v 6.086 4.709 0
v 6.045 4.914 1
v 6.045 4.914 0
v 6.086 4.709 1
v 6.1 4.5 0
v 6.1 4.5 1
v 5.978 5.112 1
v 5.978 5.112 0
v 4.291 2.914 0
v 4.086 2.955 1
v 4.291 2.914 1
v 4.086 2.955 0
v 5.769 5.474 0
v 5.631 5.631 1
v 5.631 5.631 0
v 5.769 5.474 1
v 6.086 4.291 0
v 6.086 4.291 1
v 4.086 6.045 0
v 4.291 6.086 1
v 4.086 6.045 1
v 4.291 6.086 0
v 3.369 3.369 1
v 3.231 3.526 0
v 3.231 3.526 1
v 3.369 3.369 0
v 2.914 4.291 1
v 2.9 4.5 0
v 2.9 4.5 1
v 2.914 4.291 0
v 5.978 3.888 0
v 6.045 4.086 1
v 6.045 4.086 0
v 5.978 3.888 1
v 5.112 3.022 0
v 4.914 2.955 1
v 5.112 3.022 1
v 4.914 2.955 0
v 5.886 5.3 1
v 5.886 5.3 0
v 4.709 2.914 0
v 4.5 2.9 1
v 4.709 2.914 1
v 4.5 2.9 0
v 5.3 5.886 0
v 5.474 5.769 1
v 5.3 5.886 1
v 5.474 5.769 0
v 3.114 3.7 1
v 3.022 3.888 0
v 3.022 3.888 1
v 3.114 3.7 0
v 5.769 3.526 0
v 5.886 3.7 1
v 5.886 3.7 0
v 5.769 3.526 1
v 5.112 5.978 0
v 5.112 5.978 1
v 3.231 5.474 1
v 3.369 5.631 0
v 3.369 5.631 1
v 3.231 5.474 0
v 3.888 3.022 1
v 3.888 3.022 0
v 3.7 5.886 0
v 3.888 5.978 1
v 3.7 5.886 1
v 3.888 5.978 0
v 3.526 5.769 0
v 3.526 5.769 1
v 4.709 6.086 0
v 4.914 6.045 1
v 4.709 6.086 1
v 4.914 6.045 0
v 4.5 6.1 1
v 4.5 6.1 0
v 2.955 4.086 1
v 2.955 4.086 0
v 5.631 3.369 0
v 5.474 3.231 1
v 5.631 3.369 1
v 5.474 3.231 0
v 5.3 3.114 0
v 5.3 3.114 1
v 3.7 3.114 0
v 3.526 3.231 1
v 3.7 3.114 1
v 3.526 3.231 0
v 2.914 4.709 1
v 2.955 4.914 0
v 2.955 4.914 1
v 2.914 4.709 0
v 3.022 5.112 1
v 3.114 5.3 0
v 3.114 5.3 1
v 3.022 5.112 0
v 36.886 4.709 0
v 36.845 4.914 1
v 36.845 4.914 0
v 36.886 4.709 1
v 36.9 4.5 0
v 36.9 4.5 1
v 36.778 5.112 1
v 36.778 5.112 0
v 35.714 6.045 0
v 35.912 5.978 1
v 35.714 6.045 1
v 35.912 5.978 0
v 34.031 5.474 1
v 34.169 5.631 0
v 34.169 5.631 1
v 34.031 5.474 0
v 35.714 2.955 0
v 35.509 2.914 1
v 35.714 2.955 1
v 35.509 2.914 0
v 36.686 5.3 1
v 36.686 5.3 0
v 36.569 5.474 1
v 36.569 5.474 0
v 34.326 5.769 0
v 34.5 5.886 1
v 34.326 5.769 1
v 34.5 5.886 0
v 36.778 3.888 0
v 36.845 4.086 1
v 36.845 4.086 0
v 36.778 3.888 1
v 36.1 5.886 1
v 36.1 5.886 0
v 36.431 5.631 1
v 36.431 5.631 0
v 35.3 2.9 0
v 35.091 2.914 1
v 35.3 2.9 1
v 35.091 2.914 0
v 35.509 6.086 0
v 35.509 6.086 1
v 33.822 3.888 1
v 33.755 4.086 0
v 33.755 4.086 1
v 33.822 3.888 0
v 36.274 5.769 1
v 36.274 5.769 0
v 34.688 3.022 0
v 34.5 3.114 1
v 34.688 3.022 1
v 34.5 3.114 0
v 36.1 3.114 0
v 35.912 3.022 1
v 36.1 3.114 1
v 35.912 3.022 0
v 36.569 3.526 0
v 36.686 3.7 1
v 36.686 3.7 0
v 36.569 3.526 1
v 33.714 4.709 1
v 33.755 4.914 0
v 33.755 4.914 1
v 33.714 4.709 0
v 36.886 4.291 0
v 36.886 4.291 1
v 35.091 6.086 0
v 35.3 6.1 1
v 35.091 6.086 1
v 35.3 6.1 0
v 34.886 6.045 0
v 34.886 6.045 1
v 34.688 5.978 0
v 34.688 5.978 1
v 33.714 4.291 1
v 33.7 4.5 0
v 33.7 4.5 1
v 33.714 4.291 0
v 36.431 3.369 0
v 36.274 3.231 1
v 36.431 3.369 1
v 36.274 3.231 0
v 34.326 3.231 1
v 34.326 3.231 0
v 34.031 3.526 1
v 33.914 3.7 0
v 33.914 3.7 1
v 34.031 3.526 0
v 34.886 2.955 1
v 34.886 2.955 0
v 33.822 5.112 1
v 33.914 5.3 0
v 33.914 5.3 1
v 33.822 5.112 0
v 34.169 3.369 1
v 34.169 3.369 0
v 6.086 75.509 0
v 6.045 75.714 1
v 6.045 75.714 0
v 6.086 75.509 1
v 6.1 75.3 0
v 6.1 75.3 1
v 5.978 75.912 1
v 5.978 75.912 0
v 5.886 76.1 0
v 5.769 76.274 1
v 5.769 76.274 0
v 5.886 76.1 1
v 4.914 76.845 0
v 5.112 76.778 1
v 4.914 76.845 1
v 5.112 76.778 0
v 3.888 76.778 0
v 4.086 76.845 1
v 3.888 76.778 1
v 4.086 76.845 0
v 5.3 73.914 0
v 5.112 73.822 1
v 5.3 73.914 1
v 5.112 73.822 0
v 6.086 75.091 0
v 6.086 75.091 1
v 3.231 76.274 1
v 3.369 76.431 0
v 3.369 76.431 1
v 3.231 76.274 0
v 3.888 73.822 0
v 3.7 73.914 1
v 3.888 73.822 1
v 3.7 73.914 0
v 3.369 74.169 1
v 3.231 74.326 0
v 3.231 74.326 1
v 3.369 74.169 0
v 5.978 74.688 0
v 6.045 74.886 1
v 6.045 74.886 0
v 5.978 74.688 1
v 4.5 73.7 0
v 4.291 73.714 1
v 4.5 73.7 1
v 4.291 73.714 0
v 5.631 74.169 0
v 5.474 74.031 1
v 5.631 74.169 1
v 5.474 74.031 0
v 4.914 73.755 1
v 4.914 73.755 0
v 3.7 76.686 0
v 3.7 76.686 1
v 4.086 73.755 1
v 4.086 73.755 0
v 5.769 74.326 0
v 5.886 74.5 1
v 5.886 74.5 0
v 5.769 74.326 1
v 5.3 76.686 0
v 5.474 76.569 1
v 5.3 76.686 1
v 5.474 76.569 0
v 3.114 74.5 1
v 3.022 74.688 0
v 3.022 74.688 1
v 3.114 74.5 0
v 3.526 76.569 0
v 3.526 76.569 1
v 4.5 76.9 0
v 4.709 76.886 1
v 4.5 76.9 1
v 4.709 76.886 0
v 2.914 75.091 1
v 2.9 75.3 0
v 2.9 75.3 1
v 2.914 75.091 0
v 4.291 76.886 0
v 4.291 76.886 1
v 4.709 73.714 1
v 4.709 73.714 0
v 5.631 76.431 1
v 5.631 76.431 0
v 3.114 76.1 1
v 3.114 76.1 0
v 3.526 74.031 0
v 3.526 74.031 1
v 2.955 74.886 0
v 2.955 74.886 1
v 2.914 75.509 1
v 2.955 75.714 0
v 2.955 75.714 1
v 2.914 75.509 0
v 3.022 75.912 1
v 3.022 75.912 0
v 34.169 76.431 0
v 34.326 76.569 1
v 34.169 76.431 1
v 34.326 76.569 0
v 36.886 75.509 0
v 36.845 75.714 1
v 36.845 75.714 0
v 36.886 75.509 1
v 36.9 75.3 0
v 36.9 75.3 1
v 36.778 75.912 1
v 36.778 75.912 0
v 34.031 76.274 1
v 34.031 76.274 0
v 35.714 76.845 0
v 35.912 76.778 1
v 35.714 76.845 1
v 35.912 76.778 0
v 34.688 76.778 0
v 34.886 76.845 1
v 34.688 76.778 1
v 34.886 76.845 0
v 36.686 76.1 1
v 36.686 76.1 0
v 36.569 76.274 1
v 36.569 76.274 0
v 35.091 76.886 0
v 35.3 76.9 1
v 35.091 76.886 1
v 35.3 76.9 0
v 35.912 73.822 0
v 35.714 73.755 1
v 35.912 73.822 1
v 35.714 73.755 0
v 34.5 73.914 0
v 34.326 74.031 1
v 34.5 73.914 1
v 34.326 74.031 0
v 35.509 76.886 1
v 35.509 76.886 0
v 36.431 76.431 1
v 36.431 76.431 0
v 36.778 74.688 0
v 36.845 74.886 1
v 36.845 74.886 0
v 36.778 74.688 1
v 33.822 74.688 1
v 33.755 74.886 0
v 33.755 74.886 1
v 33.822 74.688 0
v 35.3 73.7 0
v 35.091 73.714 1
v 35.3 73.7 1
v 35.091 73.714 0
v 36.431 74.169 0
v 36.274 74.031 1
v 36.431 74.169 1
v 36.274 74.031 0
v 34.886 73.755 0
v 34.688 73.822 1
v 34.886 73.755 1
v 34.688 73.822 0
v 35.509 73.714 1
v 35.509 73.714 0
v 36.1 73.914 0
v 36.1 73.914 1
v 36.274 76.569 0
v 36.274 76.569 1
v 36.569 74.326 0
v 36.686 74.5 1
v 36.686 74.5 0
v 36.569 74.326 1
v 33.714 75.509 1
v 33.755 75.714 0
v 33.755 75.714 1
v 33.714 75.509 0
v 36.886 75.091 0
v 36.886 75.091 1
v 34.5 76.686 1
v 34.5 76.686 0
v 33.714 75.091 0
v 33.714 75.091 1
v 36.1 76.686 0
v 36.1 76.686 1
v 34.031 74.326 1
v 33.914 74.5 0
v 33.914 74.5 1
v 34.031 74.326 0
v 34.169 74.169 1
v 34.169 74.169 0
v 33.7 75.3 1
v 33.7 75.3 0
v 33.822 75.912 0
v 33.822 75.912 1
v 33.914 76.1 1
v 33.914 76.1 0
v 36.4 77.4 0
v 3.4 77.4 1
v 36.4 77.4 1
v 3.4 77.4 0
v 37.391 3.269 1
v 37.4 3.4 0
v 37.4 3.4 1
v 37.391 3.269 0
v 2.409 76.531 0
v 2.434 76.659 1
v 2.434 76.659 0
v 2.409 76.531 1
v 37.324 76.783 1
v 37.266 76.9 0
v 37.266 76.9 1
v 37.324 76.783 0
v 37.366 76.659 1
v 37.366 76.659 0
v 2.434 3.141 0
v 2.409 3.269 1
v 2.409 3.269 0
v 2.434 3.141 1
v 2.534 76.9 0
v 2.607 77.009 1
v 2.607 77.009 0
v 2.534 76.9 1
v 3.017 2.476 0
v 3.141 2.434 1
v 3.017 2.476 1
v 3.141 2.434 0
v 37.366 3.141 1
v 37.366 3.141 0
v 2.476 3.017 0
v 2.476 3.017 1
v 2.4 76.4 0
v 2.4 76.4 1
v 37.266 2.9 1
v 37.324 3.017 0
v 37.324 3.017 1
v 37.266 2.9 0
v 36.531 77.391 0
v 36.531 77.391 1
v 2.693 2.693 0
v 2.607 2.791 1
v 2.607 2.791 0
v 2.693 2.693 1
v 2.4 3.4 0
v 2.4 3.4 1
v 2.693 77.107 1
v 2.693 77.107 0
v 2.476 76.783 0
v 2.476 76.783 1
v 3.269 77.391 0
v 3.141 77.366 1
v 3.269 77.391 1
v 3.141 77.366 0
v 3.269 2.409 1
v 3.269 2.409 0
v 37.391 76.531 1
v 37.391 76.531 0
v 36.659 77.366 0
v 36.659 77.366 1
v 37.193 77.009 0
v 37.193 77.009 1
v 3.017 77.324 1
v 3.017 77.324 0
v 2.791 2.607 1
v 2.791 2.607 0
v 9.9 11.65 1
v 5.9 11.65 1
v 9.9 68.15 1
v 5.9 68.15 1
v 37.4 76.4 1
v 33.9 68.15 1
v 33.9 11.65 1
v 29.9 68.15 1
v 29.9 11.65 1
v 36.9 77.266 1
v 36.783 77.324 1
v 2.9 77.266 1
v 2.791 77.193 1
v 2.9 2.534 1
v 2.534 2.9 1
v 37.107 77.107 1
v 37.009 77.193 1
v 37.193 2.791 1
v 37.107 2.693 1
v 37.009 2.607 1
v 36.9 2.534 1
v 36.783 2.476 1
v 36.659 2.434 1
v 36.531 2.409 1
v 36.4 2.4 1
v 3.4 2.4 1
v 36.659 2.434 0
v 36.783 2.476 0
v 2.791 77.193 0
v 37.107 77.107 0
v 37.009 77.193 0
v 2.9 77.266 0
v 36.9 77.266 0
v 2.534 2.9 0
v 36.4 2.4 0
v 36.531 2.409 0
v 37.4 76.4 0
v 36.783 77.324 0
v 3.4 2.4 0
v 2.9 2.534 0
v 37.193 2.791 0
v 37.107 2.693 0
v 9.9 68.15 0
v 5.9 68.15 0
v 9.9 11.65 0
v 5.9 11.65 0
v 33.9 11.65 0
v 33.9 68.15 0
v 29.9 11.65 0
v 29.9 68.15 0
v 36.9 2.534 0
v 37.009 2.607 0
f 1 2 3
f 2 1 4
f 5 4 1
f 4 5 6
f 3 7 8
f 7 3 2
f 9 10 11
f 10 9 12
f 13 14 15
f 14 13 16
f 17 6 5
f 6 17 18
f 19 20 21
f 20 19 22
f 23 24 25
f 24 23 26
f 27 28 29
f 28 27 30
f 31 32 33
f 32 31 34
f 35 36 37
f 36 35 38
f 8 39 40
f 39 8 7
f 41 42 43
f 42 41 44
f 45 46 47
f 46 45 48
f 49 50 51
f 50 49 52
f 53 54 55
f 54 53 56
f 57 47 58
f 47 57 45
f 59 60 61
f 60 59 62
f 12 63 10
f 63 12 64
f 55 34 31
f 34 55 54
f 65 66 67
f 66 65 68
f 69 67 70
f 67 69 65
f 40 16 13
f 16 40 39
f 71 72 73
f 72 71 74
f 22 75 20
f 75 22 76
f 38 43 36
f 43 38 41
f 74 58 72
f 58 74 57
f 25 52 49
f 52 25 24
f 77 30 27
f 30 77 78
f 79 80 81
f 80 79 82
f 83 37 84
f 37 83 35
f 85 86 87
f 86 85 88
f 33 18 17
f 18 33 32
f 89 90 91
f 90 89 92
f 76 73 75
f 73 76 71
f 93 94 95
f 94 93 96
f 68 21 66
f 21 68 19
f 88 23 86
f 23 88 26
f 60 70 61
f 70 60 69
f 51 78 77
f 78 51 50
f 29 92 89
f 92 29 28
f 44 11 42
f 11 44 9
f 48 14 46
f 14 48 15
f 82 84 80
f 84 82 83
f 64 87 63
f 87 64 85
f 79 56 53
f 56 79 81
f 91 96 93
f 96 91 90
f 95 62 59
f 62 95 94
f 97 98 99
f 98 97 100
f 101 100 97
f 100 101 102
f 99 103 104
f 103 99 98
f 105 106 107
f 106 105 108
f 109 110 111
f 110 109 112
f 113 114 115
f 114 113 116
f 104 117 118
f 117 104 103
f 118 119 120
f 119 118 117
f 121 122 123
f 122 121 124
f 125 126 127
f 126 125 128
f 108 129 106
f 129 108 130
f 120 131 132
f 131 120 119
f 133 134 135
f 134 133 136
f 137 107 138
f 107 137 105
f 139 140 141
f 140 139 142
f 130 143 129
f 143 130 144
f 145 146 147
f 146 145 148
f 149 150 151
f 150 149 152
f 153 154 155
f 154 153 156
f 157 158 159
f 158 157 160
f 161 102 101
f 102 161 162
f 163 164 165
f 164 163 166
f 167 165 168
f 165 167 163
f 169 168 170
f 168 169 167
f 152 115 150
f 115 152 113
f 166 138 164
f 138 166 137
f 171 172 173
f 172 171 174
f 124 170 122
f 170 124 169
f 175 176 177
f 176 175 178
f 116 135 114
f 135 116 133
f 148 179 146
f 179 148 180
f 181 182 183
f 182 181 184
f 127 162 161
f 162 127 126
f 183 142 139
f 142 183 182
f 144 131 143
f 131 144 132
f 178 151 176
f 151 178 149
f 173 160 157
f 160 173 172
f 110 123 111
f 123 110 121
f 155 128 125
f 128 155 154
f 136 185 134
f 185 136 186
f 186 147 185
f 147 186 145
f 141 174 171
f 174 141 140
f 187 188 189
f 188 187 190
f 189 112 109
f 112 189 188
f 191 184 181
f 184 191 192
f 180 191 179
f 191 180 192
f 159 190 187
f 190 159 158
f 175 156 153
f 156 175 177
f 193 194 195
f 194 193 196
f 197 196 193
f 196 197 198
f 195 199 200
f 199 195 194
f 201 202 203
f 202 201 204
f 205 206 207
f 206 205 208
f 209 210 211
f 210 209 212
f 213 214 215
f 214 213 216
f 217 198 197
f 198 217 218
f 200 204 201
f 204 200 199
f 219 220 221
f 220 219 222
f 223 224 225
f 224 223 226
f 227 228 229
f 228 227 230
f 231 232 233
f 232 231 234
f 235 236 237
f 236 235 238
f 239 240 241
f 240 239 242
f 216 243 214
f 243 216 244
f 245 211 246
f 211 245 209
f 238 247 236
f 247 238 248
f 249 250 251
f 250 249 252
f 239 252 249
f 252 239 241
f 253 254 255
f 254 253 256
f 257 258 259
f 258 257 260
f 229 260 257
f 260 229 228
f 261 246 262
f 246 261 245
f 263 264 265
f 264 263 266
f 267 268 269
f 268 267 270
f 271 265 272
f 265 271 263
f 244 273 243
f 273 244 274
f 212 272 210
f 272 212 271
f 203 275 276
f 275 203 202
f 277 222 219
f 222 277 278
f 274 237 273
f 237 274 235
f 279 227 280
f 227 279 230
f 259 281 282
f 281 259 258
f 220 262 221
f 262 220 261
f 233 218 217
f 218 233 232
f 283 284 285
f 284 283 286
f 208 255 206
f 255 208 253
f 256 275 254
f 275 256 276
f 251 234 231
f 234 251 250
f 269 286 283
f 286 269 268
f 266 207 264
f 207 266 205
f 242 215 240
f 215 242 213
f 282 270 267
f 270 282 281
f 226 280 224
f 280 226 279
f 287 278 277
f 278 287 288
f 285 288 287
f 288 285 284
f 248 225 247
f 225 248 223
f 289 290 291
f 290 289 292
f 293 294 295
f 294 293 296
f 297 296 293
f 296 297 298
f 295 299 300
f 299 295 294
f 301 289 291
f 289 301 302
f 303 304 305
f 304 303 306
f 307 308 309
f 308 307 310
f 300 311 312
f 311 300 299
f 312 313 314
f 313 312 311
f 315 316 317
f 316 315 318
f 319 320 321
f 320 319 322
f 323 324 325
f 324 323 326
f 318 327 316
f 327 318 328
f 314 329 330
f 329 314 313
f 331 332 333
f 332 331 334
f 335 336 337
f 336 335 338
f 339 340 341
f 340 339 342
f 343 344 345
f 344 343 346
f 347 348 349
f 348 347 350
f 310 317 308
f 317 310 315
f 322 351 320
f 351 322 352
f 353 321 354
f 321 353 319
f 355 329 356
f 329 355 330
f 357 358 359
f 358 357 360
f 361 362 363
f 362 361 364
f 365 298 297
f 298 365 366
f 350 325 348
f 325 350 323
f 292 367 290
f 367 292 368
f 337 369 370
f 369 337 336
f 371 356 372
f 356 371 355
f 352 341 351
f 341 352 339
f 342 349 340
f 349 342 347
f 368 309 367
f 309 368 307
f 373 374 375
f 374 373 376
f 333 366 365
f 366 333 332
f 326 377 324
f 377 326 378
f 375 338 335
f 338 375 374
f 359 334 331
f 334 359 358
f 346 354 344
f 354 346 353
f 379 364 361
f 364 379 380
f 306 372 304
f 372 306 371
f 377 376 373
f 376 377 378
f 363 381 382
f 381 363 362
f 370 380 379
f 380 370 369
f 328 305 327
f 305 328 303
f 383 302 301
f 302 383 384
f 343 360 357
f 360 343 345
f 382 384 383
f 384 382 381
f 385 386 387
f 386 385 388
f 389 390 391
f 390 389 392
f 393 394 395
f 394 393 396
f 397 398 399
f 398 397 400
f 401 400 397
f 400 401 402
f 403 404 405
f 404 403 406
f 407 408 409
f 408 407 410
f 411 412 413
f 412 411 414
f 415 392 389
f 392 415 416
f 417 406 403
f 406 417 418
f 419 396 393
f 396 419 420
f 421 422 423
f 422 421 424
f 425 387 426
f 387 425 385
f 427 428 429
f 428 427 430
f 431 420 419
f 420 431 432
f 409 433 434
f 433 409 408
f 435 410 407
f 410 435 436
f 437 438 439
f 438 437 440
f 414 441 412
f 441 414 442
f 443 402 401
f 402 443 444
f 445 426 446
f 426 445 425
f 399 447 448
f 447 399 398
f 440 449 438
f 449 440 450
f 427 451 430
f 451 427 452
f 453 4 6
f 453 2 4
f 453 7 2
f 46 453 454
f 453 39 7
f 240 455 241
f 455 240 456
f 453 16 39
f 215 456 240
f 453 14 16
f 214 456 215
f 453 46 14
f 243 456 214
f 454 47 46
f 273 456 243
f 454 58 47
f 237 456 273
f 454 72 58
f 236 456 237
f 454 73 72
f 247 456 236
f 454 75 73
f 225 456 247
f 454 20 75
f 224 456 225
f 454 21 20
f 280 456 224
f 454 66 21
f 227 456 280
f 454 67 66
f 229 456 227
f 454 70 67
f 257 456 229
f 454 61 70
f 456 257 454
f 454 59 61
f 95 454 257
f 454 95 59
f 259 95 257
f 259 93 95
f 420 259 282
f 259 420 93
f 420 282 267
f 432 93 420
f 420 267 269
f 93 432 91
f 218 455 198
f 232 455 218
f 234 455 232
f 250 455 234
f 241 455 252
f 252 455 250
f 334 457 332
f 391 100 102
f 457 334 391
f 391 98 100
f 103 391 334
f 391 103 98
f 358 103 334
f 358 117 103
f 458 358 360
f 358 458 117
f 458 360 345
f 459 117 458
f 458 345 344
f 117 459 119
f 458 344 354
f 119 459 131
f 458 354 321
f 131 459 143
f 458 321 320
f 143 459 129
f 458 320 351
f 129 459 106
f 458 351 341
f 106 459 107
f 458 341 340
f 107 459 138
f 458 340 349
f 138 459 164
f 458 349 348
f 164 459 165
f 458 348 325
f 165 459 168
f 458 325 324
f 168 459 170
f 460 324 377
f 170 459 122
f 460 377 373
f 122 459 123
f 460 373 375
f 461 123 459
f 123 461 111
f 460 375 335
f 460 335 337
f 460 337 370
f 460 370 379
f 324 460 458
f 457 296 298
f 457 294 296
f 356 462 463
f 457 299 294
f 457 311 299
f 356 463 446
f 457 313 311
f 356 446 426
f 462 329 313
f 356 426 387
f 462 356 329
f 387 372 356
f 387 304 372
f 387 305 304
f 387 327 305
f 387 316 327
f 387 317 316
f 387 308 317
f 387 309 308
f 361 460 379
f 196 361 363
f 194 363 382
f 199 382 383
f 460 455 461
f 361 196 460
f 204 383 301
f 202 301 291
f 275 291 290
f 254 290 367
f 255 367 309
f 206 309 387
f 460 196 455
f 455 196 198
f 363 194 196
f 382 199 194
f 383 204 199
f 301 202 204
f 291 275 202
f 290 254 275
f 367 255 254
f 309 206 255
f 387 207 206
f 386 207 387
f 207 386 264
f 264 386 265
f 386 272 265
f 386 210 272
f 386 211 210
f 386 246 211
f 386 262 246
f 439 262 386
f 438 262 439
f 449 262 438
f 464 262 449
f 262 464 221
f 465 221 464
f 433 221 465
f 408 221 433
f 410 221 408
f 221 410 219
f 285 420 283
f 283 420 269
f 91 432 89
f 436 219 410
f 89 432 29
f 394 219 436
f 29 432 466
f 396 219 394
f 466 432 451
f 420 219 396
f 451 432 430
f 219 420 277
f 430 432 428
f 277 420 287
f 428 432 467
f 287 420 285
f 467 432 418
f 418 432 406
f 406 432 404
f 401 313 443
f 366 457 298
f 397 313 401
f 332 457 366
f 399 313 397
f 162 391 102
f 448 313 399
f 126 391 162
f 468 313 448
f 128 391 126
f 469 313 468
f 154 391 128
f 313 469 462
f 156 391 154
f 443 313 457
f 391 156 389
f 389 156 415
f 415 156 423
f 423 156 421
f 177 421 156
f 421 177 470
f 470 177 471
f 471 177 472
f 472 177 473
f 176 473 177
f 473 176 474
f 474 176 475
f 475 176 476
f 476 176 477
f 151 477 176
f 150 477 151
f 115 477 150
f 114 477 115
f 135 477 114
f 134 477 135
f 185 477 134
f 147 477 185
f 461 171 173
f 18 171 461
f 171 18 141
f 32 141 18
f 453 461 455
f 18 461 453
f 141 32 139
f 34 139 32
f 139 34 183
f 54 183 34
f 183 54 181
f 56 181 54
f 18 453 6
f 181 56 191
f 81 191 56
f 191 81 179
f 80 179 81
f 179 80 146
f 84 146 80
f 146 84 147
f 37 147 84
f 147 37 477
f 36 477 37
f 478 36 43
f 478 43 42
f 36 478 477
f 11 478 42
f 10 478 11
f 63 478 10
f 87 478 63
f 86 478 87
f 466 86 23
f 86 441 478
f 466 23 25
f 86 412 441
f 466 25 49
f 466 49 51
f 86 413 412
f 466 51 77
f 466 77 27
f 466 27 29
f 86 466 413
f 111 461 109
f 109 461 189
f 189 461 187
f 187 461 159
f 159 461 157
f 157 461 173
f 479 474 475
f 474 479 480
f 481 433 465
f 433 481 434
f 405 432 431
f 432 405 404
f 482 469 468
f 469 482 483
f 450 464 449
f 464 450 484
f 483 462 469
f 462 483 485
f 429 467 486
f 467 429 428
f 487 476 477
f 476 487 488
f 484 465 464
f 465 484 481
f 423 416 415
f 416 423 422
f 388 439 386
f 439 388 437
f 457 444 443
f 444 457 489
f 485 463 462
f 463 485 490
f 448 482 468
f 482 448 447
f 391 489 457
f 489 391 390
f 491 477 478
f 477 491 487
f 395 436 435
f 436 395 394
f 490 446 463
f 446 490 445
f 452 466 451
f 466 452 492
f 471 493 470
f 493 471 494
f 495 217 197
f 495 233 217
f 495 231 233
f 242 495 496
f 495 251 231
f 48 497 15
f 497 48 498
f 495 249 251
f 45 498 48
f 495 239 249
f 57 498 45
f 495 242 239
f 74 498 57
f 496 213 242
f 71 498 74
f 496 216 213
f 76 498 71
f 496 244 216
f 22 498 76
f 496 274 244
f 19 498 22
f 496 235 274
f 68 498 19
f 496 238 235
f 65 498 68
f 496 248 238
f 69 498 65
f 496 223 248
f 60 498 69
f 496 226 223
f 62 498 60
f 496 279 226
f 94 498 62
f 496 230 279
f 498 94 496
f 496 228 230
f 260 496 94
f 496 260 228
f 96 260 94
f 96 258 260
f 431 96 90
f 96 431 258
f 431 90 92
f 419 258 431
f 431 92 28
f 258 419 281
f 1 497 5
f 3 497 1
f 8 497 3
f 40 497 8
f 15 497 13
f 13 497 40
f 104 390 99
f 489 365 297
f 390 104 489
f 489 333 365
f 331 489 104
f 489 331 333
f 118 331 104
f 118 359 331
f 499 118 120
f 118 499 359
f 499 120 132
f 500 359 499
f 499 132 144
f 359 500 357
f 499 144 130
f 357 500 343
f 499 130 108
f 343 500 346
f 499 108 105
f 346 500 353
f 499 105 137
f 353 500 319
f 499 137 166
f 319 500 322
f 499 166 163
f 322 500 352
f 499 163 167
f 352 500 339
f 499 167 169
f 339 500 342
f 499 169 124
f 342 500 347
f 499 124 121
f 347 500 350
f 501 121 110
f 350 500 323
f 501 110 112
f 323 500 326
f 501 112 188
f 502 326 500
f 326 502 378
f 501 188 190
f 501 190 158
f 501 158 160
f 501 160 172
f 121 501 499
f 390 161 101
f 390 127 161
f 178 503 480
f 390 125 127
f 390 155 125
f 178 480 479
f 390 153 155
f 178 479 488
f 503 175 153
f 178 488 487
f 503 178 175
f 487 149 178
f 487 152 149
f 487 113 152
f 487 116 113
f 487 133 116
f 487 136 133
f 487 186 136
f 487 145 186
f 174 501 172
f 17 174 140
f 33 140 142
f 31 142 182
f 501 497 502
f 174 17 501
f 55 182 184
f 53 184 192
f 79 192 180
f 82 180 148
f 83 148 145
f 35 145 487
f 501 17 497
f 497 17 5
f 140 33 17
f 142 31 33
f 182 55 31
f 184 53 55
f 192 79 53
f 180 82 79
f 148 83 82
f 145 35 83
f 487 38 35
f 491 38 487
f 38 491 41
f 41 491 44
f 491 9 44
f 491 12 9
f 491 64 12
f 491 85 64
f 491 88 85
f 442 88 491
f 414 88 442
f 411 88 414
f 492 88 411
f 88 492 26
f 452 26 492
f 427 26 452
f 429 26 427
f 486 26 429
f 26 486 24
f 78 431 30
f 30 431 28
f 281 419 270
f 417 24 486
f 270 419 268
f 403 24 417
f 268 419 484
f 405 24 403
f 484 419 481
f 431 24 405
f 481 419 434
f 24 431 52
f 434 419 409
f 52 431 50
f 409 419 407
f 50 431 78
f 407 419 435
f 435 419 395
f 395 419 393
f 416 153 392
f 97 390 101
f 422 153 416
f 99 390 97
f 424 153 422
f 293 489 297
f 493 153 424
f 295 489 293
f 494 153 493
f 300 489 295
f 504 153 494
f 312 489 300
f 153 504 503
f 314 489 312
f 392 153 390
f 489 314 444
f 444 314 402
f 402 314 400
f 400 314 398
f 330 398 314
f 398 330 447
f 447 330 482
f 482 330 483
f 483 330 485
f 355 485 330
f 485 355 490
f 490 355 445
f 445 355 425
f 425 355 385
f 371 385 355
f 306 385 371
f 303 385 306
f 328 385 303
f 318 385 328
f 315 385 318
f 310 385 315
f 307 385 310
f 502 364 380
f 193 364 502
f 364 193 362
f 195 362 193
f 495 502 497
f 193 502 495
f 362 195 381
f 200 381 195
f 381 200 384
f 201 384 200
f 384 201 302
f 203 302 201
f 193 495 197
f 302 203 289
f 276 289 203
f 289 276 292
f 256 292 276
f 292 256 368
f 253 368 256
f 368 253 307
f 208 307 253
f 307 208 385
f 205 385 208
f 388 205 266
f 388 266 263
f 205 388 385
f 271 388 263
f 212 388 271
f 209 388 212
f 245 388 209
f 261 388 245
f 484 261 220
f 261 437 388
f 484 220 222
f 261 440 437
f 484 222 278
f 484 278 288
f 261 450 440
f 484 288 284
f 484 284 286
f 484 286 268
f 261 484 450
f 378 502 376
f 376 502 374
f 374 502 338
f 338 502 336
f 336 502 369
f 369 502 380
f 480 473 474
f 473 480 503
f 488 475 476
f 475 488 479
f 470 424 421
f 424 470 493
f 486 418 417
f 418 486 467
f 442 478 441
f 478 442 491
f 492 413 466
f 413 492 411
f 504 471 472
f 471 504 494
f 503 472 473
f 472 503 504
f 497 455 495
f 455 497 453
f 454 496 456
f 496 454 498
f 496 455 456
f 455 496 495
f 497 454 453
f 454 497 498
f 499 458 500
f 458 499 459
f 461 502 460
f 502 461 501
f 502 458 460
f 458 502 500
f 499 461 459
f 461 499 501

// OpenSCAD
// Dilder Case Separator Sheet — thin divider plate with pass-through slots
//
// A flat sheet that sits between enclosure layers. Same inner footprint as the
// top cover (rounded corners), with two long rectangular slots matching the
// middle plate header slots and screw clearance holes at all 4 corners.
//
// Export:
//   openscad -o case-separator.3mf case-separator.scad

$fn = 48;

// ---- Board (Olimex ESP32-S3-DevKit-Lipo) ----
board_len      = 56;
board_wid      = 28;
antenna_proj   = 6;
header_gap     = 22;
header_slot_len = 56.5;    // matches middle plate v2
header_slot_wid = 4;       // matches middle plate v2

// ---- Waveshare 2.13" display ----
disp_len       = 65;
disp_wid       = 30;

// ---- 1000 mAh battery ----
bat_len        = 52;
bat_wid        = 35;

// ---- Enclosure geometry ----
wall_thk       = 2;
plate_thk      = 1;        // thin separator sheet
pillar         = 5;
slop           = 0.4;

screw_clr      = 3.2;

// ---- Rounding ----
plate_corner_r = 1;        // matches top cover inner corners

// ---- XY layout ----
inner_wid      = max(board_wid, disp_wid, bat_wid) + 2 * slop;
inner_len      = max(board_len + antenna_proj, disp_len + 2 * pillar, bat_len) + 2 * slop;
outer_wid      = inner_wid + 2 * wall_thk;
outer_len      = inner_len + 2 * wall_thk;

plate_w = inner_wid - 2 * slop;
plate_l = inner_len - 2 * slop;
plate_origin_x = wall_thk + slop;
plate_origin_y = wall_thk + slop;

pillar_xy = [
    [wall_thk,                             wall_thk                            ],
    [outer_wid - wall_thk - pillar,        wall_thk                            ],
    [wall_thk,                             outer_len - wall_thk - pillar       ],
    [outer_wid - wall_thk - pillar,        outer_len - wall_thk - pillar       ],
];

board_x        = (outer_wid - board_wid) / 2;


// ============== SHARED ==============

module rounded_v_box(w, l, h, r, fn = 48) {
    hull() {
        for (x = [r, w - r])
            for (y = [r, l - r])
                translate([x, y, 0])
                    cylinder(r = r, h = h, $fn = fn);
    }
}


// ============== CASE SEPARATOR ==============

module case_separator() {
    hdr_strip = (board_wid - header_gap) / 2;
    header_slot_x_left  = board_x - plate_origin_x;
    header_slot_x_right = board_x + board_wid - header_slot_wid - plate_origin_x;
    header_slot_y_start = (plate_l - header_slot_len) / 2;

    translate([plate_origin_x, plate_origin_y, 0])
    difference() {
        // Flat sheet with rounded corners matching top cover inner profile
        rounded_v_box(plate_w, plate_l, plate_thk, plate_corner_r);

        // Left rectangular slot
        translate([header_slot_x_left, header_slot_y_start, -0.1])
            cube([header_slot_wid, header_slot_len, plate_thk + 0.2]);

        // Right rectangular slot
        translate([header_slot_x_right, header_slot_y_start, -0.1])
            cube([header_slot_wid, header_slot_len, plate_thk + 0.2]);

        // Screw clearance holes
        for (p = pillar_xy)
            translate([p[0] + pillar/2 - plate_origin_x, p[1] + pillar/2 - plate_origin_y, -0.1])
                cylinder(h = plate_thk + 0.2, d = screw_clr);
    }
}

case_separator();
